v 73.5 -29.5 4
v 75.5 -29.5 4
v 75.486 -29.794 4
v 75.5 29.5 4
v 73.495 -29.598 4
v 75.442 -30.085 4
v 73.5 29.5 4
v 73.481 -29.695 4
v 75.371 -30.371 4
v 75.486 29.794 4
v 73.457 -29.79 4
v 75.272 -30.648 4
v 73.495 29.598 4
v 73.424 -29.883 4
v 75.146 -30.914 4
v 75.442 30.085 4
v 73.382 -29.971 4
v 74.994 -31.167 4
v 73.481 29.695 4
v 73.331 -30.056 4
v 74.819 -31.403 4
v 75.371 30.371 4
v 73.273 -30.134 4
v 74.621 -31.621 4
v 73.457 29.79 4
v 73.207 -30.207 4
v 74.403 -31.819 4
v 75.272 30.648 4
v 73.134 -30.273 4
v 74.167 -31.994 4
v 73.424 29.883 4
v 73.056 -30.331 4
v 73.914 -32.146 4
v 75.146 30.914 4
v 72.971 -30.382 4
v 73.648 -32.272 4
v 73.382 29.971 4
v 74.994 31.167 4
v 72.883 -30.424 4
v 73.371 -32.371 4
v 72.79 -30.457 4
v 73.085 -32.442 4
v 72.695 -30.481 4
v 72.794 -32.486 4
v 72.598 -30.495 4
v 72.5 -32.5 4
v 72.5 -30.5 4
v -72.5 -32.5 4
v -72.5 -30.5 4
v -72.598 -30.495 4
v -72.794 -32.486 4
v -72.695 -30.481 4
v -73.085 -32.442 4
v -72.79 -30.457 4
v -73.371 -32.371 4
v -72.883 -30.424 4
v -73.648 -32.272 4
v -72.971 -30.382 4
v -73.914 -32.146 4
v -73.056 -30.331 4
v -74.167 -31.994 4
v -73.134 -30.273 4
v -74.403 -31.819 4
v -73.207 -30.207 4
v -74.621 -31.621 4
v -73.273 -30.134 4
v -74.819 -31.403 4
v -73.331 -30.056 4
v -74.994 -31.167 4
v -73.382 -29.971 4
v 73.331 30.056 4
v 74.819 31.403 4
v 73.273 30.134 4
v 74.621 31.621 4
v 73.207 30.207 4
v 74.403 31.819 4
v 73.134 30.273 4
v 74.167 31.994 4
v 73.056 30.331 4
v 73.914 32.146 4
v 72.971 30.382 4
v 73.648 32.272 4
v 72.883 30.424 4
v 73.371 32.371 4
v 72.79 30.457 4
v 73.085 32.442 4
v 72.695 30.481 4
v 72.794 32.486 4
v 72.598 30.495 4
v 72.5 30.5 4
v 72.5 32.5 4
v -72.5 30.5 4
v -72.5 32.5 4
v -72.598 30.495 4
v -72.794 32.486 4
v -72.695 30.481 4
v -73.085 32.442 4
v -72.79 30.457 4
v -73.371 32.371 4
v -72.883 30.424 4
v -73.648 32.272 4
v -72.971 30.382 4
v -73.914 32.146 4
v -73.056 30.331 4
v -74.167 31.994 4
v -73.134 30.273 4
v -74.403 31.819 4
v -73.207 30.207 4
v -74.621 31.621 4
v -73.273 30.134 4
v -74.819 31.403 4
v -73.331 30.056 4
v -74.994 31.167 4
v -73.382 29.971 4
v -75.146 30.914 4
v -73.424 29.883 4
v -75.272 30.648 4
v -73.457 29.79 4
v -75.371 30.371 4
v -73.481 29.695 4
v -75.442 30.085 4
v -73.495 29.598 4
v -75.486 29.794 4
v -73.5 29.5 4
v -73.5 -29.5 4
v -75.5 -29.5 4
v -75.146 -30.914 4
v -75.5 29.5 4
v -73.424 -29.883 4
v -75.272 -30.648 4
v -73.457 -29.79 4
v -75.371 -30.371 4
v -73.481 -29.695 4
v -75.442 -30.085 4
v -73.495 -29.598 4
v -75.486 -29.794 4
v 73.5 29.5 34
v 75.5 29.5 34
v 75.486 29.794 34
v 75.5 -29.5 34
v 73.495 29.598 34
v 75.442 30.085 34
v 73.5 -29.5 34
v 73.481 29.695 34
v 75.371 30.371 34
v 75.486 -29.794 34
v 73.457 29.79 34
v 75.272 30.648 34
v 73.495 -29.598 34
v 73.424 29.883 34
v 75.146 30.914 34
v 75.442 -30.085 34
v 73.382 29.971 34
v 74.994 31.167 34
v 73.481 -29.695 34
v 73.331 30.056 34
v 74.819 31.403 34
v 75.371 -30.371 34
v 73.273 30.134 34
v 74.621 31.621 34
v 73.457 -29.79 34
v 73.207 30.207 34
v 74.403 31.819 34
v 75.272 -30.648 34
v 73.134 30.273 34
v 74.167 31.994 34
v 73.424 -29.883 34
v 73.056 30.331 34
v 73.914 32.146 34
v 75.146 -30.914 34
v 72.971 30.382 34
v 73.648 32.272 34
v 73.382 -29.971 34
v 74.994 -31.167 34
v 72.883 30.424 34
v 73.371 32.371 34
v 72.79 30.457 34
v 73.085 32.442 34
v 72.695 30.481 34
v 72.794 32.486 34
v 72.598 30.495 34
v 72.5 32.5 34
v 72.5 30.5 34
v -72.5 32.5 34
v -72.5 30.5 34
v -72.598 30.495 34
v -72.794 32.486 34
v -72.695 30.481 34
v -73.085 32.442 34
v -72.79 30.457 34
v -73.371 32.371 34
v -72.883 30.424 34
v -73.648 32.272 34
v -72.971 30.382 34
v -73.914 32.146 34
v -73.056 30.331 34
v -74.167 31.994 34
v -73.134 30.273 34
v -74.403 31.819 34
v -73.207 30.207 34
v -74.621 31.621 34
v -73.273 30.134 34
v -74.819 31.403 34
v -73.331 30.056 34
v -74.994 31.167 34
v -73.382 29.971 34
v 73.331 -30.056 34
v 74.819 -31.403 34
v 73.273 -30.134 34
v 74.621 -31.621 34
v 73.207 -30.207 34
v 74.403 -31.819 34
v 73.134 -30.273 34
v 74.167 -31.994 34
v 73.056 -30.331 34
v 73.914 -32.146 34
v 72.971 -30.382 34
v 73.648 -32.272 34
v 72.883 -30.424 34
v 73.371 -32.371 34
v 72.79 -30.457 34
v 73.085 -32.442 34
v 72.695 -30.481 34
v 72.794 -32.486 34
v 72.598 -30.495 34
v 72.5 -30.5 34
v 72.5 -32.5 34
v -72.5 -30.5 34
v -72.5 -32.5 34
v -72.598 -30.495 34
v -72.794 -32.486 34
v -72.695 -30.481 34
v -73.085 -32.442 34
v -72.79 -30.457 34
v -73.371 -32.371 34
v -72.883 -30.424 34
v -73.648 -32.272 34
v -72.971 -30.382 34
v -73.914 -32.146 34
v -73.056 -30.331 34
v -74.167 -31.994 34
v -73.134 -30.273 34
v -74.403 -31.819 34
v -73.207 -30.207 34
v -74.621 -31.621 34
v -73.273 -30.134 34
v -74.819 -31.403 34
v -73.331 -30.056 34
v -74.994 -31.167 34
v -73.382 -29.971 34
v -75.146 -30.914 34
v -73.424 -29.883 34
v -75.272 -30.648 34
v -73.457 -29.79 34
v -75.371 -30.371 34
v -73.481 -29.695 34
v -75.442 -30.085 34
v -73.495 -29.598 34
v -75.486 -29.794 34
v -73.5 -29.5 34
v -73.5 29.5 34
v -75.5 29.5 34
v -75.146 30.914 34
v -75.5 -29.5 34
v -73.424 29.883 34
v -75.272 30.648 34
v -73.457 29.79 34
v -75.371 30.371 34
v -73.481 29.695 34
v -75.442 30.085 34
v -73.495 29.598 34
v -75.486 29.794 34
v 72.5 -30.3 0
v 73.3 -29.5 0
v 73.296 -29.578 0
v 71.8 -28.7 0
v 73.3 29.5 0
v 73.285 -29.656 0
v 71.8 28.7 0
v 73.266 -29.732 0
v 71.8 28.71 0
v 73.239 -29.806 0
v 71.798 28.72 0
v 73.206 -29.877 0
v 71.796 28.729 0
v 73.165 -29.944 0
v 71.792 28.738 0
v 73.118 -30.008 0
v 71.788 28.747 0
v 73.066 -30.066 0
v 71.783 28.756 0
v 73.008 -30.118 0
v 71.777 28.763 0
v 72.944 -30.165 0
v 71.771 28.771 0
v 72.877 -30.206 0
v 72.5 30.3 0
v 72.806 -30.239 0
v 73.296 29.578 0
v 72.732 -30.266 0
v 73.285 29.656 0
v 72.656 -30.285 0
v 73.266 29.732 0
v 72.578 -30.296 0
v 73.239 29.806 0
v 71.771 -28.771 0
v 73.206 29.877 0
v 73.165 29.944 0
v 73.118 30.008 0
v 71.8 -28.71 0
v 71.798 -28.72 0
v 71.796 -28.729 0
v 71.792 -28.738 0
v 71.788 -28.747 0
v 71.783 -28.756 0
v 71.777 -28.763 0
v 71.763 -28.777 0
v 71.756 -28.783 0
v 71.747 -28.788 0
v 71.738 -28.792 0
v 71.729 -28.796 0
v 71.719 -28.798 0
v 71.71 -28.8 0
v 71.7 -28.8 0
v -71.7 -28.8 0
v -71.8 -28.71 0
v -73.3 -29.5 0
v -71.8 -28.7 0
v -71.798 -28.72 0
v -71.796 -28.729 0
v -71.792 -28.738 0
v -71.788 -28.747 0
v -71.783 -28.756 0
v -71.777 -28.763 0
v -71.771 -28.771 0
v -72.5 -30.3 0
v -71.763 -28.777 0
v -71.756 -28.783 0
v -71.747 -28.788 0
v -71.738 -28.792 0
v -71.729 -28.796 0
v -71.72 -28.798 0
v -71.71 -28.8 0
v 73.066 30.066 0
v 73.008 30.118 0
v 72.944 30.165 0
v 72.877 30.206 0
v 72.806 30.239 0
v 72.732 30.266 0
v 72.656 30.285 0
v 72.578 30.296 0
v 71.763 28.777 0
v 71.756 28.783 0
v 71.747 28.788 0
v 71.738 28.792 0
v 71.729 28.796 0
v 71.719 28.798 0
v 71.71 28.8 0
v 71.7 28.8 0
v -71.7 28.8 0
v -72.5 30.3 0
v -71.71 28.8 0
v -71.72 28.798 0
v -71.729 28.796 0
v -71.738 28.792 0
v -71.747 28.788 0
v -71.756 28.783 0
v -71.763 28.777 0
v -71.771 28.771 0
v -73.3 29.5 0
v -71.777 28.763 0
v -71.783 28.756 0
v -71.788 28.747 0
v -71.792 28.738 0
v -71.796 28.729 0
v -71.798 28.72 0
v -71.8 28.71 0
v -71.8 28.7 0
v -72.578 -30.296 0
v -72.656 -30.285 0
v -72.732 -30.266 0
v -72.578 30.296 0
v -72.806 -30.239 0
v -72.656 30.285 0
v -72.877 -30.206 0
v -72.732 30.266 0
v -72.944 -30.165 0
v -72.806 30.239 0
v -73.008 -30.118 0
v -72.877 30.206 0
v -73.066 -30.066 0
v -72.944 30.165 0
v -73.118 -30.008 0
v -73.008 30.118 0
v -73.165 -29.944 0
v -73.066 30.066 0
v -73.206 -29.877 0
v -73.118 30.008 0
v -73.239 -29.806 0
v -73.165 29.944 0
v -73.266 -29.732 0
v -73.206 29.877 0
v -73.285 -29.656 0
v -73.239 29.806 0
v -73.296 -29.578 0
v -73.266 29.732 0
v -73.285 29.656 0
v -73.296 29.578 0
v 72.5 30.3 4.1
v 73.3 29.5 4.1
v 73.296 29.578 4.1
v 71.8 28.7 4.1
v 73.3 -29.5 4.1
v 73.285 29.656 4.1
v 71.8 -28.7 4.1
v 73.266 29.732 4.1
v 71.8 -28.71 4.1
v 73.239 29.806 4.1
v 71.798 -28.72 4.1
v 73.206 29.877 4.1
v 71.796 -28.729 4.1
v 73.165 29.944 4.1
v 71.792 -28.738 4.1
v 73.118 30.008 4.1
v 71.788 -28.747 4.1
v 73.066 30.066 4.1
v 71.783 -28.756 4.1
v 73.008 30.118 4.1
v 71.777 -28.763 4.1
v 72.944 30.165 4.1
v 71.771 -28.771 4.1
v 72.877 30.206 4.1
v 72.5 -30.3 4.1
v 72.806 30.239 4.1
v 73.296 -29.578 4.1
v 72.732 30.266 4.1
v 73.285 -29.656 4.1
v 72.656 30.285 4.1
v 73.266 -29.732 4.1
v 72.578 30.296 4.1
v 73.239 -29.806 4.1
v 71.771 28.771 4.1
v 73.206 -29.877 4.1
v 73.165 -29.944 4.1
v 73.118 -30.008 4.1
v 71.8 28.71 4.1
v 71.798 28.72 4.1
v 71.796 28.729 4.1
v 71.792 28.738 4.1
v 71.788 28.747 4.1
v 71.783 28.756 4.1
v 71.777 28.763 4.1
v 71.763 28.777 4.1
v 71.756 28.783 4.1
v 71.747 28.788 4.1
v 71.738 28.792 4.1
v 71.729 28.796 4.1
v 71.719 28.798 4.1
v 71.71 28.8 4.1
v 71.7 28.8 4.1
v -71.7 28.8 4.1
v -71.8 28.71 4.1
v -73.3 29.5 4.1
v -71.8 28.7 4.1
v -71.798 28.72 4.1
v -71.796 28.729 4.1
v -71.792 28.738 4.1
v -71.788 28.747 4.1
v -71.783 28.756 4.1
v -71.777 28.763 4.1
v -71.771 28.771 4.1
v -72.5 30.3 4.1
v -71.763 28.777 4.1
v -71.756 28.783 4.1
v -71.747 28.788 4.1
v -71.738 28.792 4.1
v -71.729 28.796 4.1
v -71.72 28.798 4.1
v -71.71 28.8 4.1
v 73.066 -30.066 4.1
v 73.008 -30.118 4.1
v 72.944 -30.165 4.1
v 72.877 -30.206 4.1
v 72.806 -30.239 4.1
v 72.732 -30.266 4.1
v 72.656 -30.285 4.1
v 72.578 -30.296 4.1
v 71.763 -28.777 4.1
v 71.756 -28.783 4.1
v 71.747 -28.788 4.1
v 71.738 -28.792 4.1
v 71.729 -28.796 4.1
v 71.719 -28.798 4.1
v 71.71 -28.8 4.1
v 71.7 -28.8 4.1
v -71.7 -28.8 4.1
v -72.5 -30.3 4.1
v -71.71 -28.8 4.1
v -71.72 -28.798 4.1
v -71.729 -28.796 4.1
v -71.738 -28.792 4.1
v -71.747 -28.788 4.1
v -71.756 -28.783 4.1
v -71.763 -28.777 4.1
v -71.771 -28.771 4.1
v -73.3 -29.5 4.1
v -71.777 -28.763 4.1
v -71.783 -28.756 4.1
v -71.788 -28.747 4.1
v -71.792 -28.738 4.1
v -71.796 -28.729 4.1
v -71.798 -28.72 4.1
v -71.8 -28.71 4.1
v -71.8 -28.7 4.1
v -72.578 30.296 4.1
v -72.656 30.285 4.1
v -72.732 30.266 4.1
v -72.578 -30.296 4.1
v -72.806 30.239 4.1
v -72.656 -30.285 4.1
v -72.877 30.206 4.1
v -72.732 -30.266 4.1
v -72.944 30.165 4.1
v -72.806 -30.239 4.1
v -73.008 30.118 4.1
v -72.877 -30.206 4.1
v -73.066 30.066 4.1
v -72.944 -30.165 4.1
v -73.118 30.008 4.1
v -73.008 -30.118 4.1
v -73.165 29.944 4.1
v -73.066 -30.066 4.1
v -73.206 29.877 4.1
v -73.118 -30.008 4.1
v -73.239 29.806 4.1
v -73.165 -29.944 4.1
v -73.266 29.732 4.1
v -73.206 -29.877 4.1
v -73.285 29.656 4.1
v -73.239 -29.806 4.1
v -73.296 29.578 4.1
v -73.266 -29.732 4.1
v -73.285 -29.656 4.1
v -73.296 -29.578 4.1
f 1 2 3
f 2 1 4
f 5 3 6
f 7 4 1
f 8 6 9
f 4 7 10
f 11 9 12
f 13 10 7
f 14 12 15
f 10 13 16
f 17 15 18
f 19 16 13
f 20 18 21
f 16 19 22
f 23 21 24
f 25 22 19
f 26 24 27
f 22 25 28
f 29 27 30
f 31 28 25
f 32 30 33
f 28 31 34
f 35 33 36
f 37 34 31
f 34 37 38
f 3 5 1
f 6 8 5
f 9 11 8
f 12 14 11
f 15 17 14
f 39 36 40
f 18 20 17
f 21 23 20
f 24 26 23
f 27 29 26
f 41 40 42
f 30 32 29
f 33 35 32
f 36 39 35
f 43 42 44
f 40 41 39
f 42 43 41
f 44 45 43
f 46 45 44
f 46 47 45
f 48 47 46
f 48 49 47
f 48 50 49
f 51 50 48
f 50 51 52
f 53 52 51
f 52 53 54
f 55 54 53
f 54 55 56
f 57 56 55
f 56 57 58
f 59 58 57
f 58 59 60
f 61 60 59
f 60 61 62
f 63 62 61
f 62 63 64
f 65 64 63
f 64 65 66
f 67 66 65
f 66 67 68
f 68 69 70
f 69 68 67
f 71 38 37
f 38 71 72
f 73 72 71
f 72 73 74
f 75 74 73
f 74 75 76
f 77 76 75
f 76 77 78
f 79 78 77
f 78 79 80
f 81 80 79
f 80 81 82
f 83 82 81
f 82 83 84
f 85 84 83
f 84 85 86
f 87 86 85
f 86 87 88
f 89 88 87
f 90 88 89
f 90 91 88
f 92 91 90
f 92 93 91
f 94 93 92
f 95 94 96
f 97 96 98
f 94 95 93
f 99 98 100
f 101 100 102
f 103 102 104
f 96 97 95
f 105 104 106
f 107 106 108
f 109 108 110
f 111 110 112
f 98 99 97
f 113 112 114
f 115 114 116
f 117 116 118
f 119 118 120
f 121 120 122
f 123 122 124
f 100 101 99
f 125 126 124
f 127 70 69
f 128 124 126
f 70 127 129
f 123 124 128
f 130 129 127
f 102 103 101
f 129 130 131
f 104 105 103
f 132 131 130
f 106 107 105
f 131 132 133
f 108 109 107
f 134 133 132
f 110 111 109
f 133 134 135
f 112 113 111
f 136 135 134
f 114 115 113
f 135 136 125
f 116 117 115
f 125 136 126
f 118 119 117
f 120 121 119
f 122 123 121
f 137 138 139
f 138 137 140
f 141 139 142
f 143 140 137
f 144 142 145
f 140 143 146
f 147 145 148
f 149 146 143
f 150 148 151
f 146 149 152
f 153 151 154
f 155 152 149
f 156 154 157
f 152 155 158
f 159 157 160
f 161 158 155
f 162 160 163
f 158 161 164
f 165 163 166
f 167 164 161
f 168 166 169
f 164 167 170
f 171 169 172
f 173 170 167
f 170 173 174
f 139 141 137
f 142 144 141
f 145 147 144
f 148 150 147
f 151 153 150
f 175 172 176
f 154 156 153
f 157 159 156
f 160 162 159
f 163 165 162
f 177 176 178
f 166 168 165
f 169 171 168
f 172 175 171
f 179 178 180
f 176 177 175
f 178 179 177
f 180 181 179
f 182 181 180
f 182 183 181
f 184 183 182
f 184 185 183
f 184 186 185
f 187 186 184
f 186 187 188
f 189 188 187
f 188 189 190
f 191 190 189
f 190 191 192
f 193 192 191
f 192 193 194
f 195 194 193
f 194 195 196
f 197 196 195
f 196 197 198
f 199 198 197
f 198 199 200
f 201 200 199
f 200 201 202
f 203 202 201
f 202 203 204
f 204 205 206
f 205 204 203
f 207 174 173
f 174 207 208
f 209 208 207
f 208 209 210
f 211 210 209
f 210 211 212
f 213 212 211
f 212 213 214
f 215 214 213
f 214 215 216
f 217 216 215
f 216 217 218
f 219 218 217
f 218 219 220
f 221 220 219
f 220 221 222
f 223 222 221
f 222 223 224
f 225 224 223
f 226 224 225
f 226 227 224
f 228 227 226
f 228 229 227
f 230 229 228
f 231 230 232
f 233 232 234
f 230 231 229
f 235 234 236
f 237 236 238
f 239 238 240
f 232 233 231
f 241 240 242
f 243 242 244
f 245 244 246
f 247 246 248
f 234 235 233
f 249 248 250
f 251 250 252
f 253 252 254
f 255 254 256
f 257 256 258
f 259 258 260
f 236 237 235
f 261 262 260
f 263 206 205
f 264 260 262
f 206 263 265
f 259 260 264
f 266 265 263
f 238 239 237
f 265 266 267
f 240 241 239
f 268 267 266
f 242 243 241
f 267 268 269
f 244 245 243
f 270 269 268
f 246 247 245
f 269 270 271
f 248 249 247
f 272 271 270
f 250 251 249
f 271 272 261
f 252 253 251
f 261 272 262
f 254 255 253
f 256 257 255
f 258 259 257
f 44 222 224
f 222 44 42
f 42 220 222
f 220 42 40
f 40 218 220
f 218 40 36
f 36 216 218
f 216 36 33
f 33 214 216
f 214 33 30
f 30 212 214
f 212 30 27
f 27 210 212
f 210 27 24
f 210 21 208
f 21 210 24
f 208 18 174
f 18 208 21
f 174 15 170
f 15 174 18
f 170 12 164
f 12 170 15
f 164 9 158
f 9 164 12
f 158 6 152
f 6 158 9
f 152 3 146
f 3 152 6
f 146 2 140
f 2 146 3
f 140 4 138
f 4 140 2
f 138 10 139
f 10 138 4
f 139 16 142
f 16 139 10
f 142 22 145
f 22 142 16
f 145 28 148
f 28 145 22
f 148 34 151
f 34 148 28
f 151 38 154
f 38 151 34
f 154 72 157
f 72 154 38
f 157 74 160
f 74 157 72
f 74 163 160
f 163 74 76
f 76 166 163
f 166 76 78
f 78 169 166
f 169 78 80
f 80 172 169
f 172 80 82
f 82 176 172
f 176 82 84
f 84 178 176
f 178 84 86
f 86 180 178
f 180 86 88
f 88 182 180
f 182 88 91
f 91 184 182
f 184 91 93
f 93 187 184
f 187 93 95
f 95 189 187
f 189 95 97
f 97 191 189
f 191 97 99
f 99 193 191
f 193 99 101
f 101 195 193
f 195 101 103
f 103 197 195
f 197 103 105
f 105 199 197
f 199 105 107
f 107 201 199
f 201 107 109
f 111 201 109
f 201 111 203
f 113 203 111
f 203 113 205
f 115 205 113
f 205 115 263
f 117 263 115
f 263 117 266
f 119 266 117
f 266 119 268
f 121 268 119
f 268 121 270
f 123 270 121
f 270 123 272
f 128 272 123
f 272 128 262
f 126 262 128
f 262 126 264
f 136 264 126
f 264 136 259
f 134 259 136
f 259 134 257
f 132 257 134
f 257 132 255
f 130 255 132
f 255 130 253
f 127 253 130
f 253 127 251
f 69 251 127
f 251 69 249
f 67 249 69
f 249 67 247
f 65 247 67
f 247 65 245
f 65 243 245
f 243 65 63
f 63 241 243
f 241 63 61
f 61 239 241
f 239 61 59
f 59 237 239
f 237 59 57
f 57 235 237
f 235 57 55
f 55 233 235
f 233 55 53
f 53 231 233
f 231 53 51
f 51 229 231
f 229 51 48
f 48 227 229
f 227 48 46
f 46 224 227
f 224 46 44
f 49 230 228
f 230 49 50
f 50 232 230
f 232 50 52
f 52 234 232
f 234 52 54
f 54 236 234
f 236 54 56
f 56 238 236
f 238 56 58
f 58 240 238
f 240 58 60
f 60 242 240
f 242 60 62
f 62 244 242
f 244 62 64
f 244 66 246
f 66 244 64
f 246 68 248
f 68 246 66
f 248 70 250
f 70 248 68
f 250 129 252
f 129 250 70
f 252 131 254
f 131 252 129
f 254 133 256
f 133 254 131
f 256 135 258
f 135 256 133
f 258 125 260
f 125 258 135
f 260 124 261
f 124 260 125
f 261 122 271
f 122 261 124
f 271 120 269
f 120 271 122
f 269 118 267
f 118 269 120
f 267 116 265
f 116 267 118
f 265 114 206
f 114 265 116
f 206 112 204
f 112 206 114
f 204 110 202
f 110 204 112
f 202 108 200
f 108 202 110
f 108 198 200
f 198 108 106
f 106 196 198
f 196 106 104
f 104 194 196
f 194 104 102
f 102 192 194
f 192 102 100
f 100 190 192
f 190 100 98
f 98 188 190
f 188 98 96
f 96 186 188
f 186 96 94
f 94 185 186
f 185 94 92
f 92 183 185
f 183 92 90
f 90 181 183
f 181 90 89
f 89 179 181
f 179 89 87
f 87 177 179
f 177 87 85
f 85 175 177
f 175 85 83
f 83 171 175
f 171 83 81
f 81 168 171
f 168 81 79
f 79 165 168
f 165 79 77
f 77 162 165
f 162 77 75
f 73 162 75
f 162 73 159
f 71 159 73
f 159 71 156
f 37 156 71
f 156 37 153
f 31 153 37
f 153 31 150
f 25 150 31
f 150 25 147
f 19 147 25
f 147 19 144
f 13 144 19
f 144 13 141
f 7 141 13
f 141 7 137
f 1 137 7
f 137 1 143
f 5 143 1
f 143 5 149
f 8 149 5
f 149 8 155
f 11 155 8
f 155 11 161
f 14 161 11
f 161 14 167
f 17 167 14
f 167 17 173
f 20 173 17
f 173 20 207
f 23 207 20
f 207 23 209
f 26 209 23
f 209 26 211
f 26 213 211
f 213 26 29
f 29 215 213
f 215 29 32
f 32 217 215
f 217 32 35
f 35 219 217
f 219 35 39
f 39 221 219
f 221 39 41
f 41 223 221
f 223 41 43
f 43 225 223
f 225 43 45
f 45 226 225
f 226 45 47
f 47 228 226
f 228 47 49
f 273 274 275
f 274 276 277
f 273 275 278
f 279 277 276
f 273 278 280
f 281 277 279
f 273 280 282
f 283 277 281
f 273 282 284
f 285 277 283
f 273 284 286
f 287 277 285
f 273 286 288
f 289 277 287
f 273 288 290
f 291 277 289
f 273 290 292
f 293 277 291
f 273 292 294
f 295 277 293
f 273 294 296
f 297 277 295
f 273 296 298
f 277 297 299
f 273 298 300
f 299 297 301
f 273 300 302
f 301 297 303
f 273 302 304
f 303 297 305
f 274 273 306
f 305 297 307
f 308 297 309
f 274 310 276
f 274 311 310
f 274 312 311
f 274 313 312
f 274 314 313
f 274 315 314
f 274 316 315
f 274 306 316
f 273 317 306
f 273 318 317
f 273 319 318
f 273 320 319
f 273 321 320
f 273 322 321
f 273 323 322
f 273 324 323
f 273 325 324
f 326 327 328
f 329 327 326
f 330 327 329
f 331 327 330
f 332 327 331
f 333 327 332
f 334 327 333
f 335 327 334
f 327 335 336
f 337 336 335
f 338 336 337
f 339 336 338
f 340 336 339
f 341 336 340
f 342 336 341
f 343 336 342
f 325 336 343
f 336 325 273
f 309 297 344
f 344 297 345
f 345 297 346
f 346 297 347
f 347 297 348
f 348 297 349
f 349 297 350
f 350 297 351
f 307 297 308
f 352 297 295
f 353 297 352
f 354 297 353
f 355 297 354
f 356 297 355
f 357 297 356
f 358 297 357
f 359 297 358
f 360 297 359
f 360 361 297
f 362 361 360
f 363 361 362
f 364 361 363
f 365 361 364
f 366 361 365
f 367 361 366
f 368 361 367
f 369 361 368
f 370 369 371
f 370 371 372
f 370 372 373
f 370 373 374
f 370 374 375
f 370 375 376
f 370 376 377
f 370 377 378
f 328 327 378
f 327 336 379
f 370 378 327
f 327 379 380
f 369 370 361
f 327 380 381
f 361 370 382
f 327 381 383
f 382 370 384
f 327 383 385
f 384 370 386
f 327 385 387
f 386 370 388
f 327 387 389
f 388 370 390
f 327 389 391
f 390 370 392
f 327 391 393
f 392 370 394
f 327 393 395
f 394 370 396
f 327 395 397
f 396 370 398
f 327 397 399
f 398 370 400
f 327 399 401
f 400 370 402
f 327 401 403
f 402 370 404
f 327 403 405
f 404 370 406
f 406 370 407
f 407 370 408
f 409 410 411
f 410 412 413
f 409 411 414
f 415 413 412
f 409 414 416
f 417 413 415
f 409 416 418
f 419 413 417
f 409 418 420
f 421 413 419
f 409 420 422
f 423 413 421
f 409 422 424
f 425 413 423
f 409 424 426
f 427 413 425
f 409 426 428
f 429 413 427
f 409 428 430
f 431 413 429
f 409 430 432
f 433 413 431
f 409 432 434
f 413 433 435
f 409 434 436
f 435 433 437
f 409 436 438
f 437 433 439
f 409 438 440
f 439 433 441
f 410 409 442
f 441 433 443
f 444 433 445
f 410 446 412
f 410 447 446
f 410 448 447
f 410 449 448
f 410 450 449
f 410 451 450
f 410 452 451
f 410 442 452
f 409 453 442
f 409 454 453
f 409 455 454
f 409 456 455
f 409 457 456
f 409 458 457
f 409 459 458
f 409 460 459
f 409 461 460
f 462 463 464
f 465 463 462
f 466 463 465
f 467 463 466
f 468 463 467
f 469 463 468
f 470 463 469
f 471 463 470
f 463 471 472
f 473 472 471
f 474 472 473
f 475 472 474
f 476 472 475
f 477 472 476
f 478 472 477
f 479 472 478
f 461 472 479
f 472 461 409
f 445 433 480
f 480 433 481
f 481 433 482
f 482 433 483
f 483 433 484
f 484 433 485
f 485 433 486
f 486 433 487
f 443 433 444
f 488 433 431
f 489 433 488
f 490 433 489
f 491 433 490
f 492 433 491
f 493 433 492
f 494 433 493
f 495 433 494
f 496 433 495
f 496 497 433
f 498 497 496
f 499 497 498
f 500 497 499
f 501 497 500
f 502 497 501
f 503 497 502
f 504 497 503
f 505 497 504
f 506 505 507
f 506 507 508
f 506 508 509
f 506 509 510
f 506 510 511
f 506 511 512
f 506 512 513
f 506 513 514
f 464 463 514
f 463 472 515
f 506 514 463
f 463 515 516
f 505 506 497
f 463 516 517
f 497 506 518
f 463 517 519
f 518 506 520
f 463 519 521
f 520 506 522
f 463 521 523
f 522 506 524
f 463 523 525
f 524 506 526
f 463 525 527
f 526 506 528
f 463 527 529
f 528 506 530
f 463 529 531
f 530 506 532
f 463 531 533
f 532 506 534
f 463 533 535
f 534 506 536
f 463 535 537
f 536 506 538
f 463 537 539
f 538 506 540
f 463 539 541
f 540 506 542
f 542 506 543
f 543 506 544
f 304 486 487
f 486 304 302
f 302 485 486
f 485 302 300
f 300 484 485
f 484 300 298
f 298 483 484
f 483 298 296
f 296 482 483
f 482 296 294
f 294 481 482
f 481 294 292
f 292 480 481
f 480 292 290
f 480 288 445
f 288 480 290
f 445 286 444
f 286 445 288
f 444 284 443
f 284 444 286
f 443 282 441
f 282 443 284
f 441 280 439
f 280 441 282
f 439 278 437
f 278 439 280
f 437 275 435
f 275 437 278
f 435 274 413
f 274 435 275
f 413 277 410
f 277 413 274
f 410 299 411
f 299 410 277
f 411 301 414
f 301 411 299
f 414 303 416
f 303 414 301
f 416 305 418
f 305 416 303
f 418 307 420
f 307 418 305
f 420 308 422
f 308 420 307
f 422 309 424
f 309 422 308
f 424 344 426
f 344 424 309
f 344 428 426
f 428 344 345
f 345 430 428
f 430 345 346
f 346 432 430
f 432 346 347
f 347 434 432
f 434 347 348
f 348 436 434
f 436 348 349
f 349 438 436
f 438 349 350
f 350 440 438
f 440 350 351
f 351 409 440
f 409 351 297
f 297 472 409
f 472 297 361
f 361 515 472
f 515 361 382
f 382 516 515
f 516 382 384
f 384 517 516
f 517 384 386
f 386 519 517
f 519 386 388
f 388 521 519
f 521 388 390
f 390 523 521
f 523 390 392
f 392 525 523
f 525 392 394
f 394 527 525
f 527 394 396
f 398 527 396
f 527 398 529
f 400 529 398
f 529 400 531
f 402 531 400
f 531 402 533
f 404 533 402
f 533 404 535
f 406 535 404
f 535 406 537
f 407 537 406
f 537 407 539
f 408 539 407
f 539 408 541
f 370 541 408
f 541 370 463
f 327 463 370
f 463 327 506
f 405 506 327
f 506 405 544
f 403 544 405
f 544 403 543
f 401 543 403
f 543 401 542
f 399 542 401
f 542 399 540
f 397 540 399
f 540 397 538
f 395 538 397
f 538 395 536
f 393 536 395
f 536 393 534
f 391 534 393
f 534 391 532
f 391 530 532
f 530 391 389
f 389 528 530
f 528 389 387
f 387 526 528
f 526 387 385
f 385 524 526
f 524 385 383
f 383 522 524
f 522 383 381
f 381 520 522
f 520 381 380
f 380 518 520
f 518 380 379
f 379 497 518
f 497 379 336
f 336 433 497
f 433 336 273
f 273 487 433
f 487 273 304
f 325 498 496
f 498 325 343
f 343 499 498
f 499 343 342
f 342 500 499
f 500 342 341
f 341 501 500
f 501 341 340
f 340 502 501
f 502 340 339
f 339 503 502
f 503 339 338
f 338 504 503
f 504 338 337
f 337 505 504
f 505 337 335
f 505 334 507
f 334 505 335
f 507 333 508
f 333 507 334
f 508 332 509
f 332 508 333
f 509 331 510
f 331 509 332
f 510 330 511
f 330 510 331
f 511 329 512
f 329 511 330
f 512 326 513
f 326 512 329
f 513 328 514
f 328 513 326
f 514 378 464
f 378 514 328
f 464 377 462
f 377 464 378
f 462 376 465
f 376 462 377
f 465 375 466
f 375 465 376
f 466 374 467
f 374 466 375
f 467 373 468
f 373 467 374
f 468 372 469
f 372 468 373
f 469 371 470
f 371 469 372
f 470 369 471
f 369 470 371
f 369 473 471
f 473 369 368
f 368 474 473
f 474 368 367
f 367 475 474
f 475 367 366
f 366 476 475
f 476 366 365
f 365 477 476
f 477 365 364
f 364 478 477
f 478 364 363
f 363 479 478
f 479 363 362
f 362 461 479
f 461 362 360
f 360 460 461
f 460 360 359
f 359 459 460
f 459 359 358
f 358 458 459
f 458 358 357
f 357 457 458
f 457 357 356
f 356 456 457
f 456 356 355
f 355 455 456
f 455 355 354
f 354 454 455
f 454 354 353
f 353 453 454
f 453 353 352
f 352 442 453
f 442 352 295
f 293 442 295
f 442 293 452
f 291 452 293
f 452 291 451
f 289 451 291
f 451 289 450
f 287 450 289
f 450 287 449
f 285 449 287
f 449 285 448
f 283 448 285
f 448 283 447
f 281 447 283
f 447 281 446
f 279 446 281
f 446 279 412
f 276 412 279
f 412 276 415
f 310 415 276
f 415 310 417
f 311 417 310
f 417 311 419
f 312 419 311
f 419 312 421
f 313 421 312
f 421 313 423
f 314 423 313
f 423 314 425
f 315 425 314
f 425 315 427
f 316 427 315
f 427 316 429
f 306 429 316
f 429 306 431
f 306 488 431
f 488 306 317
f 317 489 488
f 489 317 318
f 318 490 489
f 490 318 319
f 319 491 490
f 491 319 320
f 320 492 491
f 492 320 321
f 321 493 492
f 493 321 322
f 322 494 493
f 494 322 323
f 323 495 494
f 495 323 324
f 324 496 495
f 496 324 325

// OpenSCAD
// Battery Box Riser
// ---------------------------------------------------------
// This part is designed to sit between the main bottom box
// and the lid, giving you extra vertical space.
// 
// You MUST measure your exact battery box and adjust 
// the dimensions below before printing!
// ---------------------------------------------------------

// --- Main Dimensions ---
// Measure the OUTSIDE of the green battery box.
outer_length = 151.0;   
outer_width = 65.0;     

// Measure the thickness of the green wall.
wall_thickness = 2.0;   

// Estimate how round the corners are.
corner_radius = 3.0;    

// --- Riser Dimensions ---
// How much extra vertical space you want (in mm).
riser_height = 30.0;    

// How deep the alignment lip should go into the bottom box.
insert_depth = 4.0;     

// Thickness of the alignment lip (usually thinner than the wall).
lip_thickness = 1.5;    

// Clearance (gap) so the lip easily slides into the box without jamming.
clearance = 0.4;        

// --- Render Settings ---
$fn = 64;

module rounded_rect(l, w, r) {
    if (r > 0) {
        hull() {
            translate([r, r]) circle(r=r);
            translate([l-r, r]) circle(r=r);
            translate([l-r, w-r]) circle(r=r);
            translate([r, w-r]) circle(r=r);
        }
    } else {
        square([l, w]);
    }
}

module riser() {
    // 1. Main Body (The new wall)
    // From Z = 0 upwards to riser_height
    translate([0, 0, 0])
    linear_extrude(height = riser_height) {
        difference() {
            // Outer profile
            rounded_rect(outer_length, outer_width, corner_radius);
            // Inner profile
            translate([wall_thickness, wall_thickness])
                rounded_rect(outer_length - 2*wall_thickness, outer_width - 2*wall_thickness, max(0.1, corner_radius - wall_thickness));
        }
    }
    
    // 2. Alignment Lip (Drops down into the original box)
    // From Z = 0 downwards to -insert_depth
    lip_outer_l = outer_length - 2*wall_thickness - clearance;
    lip_outer_w = outer_width - 2*wall_thickness - clearance;
    lip_offset_x = wall_thickness + clearance/2;
    lip_offset_y = wall_thickness + clearance/2;
    lip_corner_r = max(0.1, corner_radius - wall_thickness - clearance/2);
    
    translate([lip_offset_x, lip_offset_y, -insert_depth])
    linear_extrude(height = insert_depth + 0.1) { // +0.1 to perfectly fuse with main body
        difference() {
            // Lip outer profile
            rounded_rect(lip_outer_l, lip_outer_w, lip_corner_r);
            // Lip inner profile
            translate([lip_thickness, lip_thickness])
                rounded_rect(lip_outer_l - 2*lip_thickness, lip_outer_w - 2*lip_thickness, max(0.1, lip_corner_r - lip_thickness));
        }
    }
}

// Center the part for printing
translate([-outer_length/2, -outer_width/2, insert_depth])
    riser();
